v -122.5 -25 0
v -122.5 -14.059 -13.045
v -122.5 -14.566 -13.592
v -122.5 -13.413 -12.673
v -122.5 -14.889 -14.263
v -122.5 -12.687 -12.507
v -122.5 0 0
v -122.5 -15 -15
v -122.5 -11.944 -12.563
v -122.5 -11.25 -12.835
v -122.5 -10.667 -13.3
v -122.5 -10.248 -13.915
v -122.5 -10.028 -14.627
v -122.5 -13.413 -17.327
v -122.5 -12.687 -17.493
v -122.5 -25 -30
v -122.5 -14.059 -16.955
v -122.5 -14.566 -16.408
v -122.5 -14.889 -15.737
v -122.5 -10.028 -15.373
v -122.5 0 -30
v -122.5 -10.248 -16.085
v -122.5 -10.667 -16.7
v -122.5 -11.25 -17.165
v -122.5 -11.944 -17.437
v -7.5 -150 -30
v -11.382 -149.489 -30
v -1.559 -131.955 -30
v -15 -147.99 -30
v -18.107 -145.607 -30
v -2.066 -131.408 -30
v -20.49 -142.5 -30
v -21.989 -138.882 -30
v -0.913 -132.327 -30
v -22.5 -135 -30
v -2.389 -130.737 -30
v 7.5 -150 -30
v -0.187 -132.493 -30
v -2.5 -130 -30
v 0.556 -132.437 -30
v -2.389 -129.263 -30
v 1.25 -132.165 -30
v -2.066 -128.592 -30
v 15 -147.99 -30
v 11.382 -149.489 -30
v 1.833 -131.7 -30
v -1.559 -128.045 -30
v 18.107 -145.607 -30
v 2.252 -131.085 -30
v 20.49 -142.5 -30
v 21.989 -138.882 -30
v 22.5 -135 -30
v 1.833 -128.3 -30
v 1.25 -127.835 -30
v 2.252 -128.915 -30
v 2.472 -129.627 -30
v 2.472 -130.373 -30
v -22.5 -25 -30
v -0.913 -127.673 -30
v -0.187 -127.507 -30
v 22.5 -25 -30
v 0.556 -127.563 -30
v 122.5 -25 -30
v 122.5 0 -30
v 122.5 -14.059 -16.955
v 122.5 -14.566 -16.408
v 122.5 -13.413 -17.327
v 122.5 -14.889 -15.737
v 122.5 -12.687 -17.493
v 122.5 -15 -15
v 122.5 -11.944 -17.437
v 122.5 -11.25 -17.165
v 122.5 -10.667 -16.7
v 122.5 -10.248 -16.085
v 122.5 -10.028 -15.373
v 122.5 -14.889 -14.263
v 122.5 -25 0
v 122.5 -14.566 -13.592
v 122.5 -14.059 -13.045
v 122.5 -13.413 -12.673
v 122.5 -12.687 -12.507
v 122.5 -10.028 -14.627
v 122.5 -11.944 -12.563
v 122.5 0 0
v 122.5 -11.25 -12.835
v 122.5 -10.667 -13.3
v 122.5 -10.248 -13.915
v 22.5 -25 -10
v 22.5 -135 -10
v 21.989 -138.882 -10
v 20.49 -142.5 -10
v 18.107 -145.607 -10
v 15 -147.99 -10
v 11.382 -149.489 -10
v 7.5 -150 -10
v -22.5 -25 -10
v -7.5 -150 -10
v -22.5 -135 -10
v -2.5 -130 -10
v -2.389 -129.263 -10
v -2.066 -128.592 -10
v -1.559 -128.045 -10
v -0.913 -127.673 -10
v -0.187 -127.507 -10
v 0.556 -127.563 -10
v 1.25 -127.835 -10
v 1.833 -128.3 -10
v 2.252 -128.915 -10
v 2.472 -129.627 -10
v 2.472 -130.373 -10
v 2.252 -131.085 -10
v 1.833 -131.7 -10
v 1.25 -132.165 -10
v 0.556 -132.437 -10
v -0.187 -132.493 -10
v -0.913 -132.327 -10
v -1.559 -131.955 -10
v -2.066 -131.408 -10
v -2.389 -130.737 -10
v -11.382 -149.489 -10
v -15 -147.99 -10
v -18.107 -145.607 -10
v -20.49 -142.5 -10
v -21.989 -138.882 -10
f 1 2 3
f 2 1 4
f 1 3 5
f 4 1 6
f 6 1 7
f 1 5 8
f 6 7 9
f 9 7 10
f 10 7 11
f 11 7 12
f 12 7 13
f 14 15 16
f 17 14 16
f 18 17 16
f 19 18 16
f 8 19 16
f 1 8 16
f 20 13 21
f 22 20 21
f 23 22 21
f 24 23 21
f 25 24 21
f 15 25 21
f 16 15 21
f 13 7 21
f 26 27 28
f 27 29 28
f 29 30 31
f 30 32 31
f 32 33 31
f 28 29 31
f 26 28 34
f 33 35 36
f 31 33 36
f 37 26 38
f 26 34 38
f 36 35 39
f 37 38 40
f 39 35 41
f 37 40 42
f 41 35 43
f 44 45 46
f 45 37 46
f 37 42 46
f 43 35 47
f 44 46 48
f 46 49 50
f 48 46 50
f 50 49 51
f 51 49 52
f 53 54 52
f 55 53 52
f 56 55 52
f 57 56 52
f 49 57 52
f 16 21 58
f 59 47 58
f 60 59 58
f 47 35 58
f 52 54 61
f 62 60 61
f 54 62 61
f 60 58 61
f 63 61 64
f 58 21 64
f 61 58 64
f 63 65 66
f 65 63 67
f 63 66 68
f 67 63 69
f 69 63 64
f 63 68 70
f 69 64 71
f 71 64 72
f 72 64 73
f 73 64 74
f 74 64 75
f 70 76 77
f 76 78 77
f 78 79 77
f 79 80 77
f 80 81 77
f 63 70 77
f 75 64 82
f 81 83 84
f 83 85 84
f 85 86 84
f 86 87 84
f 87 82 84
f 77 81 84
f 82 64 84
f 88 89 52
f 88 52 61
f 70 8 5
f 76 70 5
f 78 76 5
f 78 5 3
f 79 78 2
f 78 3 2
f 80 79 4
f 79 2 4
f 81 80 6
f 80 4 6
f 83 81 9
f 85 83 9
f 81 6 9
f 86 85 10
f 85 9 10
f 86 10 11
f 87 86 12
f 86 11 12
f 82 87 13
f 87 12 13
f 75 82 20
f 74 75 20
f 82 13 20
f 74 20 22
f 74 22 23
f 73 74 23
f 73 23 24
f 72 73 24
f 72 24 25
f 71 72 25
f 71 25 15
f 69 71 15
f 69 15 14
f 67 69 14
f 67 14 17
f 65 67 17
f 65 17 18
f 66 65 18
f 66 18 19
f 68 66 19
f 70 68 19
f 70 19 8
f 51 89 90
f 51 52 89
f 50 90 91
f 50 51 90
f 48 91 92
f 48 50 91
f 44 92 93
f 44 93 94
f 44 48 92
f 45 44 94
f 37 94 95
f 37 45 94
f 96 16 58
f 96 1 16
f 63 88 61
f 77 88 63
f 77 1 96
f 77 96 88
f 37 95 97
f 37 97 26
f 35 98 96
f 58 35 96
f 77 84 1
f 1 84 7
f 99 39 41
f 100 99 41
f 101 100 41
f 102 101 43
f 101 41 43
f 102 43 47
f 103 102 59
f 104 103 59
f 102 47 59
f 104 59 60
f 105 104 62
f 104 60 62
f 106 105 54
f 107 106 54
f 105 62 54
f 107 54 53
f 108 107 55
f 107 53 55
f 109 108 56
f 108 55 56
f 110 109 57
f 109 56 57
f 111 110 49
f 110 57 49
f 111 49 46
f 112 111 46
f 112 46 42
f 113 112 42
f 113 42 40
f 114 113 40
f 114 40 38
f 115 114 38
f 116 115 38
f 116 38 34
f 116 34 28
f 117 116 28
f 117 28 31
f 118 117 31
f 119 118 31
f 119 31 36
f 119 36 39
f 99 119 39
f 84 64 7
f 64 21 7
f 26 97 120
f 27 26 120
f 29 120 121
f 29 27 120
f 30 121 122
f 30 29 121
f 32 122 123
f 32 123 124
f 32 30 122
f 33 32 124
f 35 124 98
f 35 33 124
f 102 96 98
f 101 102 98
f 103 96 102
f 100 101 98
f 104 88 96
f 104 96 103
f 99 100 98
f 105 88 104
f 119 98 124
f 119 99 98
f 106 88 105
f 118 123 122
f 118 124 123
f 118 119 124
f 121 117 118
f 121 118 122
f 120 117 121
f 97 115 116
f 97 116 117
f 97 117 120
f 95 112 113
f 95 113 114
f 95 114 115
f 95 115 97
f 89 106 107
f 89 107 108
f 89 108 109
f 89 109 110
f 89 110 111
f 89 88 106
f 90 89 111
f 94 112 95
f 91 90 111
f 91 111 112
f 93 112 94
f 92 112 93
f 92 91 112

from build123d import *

# Parameters (mm, degrees)
F1_DEPTH      = 25
F3_DEPTH      = 22.5
F3_DEPTH_BACK = 22.5
F4_R          = 15
F6_D          = 5
F8_D          = 5


with BuildPart() as f1:
    # F0 (on Front) → F1 (new body)
    with BuildSketch(Plane.XZ):
        Polygon((-22.5, -20), (0, -20), (0, 0), (-122.5, 0), (-122.5, -30), (-22.5, -30), align=None)
        Polygon((0, 0), (0, -20), (22.5, -20), (22.5, -30), (122.5, -30), (122.5, 0), align=None)
    extrude(amount=F1_DEPTH)

    # F2 (on Right) → F3 (join, two sides)
    with BuildSketch(Plane.YZ) as f3_sk:
        Polygon((-25, -10), (-150, -10), (-150, -30), (0, -30), (0, -20), (-25, -20), align=None)
    extrude(amount=F3_DEPTH)
    extrude(f3_sk.sketch, amount=-F3_DEPTH_BACK)

    # F4
    f4_edges = [f1.edges().sort_by_distance(p)[0] for p in [
        (-22.5, -150, -20),
        (22.5, -150, -20),
    ]]
    fillet(f4_edges, radius=F4_R)

    # F6 (through all)
    with Locations(Plane.XY):
        with Locations((0, -130)):
            Hole(F6_D / 2)

    # F8 (through all)
    with Locations(Plane.YZ.offset(122.5)):
        with Locations((-12.5, -15)):
            Hole(F8_D / 2)


solid = f1.part
